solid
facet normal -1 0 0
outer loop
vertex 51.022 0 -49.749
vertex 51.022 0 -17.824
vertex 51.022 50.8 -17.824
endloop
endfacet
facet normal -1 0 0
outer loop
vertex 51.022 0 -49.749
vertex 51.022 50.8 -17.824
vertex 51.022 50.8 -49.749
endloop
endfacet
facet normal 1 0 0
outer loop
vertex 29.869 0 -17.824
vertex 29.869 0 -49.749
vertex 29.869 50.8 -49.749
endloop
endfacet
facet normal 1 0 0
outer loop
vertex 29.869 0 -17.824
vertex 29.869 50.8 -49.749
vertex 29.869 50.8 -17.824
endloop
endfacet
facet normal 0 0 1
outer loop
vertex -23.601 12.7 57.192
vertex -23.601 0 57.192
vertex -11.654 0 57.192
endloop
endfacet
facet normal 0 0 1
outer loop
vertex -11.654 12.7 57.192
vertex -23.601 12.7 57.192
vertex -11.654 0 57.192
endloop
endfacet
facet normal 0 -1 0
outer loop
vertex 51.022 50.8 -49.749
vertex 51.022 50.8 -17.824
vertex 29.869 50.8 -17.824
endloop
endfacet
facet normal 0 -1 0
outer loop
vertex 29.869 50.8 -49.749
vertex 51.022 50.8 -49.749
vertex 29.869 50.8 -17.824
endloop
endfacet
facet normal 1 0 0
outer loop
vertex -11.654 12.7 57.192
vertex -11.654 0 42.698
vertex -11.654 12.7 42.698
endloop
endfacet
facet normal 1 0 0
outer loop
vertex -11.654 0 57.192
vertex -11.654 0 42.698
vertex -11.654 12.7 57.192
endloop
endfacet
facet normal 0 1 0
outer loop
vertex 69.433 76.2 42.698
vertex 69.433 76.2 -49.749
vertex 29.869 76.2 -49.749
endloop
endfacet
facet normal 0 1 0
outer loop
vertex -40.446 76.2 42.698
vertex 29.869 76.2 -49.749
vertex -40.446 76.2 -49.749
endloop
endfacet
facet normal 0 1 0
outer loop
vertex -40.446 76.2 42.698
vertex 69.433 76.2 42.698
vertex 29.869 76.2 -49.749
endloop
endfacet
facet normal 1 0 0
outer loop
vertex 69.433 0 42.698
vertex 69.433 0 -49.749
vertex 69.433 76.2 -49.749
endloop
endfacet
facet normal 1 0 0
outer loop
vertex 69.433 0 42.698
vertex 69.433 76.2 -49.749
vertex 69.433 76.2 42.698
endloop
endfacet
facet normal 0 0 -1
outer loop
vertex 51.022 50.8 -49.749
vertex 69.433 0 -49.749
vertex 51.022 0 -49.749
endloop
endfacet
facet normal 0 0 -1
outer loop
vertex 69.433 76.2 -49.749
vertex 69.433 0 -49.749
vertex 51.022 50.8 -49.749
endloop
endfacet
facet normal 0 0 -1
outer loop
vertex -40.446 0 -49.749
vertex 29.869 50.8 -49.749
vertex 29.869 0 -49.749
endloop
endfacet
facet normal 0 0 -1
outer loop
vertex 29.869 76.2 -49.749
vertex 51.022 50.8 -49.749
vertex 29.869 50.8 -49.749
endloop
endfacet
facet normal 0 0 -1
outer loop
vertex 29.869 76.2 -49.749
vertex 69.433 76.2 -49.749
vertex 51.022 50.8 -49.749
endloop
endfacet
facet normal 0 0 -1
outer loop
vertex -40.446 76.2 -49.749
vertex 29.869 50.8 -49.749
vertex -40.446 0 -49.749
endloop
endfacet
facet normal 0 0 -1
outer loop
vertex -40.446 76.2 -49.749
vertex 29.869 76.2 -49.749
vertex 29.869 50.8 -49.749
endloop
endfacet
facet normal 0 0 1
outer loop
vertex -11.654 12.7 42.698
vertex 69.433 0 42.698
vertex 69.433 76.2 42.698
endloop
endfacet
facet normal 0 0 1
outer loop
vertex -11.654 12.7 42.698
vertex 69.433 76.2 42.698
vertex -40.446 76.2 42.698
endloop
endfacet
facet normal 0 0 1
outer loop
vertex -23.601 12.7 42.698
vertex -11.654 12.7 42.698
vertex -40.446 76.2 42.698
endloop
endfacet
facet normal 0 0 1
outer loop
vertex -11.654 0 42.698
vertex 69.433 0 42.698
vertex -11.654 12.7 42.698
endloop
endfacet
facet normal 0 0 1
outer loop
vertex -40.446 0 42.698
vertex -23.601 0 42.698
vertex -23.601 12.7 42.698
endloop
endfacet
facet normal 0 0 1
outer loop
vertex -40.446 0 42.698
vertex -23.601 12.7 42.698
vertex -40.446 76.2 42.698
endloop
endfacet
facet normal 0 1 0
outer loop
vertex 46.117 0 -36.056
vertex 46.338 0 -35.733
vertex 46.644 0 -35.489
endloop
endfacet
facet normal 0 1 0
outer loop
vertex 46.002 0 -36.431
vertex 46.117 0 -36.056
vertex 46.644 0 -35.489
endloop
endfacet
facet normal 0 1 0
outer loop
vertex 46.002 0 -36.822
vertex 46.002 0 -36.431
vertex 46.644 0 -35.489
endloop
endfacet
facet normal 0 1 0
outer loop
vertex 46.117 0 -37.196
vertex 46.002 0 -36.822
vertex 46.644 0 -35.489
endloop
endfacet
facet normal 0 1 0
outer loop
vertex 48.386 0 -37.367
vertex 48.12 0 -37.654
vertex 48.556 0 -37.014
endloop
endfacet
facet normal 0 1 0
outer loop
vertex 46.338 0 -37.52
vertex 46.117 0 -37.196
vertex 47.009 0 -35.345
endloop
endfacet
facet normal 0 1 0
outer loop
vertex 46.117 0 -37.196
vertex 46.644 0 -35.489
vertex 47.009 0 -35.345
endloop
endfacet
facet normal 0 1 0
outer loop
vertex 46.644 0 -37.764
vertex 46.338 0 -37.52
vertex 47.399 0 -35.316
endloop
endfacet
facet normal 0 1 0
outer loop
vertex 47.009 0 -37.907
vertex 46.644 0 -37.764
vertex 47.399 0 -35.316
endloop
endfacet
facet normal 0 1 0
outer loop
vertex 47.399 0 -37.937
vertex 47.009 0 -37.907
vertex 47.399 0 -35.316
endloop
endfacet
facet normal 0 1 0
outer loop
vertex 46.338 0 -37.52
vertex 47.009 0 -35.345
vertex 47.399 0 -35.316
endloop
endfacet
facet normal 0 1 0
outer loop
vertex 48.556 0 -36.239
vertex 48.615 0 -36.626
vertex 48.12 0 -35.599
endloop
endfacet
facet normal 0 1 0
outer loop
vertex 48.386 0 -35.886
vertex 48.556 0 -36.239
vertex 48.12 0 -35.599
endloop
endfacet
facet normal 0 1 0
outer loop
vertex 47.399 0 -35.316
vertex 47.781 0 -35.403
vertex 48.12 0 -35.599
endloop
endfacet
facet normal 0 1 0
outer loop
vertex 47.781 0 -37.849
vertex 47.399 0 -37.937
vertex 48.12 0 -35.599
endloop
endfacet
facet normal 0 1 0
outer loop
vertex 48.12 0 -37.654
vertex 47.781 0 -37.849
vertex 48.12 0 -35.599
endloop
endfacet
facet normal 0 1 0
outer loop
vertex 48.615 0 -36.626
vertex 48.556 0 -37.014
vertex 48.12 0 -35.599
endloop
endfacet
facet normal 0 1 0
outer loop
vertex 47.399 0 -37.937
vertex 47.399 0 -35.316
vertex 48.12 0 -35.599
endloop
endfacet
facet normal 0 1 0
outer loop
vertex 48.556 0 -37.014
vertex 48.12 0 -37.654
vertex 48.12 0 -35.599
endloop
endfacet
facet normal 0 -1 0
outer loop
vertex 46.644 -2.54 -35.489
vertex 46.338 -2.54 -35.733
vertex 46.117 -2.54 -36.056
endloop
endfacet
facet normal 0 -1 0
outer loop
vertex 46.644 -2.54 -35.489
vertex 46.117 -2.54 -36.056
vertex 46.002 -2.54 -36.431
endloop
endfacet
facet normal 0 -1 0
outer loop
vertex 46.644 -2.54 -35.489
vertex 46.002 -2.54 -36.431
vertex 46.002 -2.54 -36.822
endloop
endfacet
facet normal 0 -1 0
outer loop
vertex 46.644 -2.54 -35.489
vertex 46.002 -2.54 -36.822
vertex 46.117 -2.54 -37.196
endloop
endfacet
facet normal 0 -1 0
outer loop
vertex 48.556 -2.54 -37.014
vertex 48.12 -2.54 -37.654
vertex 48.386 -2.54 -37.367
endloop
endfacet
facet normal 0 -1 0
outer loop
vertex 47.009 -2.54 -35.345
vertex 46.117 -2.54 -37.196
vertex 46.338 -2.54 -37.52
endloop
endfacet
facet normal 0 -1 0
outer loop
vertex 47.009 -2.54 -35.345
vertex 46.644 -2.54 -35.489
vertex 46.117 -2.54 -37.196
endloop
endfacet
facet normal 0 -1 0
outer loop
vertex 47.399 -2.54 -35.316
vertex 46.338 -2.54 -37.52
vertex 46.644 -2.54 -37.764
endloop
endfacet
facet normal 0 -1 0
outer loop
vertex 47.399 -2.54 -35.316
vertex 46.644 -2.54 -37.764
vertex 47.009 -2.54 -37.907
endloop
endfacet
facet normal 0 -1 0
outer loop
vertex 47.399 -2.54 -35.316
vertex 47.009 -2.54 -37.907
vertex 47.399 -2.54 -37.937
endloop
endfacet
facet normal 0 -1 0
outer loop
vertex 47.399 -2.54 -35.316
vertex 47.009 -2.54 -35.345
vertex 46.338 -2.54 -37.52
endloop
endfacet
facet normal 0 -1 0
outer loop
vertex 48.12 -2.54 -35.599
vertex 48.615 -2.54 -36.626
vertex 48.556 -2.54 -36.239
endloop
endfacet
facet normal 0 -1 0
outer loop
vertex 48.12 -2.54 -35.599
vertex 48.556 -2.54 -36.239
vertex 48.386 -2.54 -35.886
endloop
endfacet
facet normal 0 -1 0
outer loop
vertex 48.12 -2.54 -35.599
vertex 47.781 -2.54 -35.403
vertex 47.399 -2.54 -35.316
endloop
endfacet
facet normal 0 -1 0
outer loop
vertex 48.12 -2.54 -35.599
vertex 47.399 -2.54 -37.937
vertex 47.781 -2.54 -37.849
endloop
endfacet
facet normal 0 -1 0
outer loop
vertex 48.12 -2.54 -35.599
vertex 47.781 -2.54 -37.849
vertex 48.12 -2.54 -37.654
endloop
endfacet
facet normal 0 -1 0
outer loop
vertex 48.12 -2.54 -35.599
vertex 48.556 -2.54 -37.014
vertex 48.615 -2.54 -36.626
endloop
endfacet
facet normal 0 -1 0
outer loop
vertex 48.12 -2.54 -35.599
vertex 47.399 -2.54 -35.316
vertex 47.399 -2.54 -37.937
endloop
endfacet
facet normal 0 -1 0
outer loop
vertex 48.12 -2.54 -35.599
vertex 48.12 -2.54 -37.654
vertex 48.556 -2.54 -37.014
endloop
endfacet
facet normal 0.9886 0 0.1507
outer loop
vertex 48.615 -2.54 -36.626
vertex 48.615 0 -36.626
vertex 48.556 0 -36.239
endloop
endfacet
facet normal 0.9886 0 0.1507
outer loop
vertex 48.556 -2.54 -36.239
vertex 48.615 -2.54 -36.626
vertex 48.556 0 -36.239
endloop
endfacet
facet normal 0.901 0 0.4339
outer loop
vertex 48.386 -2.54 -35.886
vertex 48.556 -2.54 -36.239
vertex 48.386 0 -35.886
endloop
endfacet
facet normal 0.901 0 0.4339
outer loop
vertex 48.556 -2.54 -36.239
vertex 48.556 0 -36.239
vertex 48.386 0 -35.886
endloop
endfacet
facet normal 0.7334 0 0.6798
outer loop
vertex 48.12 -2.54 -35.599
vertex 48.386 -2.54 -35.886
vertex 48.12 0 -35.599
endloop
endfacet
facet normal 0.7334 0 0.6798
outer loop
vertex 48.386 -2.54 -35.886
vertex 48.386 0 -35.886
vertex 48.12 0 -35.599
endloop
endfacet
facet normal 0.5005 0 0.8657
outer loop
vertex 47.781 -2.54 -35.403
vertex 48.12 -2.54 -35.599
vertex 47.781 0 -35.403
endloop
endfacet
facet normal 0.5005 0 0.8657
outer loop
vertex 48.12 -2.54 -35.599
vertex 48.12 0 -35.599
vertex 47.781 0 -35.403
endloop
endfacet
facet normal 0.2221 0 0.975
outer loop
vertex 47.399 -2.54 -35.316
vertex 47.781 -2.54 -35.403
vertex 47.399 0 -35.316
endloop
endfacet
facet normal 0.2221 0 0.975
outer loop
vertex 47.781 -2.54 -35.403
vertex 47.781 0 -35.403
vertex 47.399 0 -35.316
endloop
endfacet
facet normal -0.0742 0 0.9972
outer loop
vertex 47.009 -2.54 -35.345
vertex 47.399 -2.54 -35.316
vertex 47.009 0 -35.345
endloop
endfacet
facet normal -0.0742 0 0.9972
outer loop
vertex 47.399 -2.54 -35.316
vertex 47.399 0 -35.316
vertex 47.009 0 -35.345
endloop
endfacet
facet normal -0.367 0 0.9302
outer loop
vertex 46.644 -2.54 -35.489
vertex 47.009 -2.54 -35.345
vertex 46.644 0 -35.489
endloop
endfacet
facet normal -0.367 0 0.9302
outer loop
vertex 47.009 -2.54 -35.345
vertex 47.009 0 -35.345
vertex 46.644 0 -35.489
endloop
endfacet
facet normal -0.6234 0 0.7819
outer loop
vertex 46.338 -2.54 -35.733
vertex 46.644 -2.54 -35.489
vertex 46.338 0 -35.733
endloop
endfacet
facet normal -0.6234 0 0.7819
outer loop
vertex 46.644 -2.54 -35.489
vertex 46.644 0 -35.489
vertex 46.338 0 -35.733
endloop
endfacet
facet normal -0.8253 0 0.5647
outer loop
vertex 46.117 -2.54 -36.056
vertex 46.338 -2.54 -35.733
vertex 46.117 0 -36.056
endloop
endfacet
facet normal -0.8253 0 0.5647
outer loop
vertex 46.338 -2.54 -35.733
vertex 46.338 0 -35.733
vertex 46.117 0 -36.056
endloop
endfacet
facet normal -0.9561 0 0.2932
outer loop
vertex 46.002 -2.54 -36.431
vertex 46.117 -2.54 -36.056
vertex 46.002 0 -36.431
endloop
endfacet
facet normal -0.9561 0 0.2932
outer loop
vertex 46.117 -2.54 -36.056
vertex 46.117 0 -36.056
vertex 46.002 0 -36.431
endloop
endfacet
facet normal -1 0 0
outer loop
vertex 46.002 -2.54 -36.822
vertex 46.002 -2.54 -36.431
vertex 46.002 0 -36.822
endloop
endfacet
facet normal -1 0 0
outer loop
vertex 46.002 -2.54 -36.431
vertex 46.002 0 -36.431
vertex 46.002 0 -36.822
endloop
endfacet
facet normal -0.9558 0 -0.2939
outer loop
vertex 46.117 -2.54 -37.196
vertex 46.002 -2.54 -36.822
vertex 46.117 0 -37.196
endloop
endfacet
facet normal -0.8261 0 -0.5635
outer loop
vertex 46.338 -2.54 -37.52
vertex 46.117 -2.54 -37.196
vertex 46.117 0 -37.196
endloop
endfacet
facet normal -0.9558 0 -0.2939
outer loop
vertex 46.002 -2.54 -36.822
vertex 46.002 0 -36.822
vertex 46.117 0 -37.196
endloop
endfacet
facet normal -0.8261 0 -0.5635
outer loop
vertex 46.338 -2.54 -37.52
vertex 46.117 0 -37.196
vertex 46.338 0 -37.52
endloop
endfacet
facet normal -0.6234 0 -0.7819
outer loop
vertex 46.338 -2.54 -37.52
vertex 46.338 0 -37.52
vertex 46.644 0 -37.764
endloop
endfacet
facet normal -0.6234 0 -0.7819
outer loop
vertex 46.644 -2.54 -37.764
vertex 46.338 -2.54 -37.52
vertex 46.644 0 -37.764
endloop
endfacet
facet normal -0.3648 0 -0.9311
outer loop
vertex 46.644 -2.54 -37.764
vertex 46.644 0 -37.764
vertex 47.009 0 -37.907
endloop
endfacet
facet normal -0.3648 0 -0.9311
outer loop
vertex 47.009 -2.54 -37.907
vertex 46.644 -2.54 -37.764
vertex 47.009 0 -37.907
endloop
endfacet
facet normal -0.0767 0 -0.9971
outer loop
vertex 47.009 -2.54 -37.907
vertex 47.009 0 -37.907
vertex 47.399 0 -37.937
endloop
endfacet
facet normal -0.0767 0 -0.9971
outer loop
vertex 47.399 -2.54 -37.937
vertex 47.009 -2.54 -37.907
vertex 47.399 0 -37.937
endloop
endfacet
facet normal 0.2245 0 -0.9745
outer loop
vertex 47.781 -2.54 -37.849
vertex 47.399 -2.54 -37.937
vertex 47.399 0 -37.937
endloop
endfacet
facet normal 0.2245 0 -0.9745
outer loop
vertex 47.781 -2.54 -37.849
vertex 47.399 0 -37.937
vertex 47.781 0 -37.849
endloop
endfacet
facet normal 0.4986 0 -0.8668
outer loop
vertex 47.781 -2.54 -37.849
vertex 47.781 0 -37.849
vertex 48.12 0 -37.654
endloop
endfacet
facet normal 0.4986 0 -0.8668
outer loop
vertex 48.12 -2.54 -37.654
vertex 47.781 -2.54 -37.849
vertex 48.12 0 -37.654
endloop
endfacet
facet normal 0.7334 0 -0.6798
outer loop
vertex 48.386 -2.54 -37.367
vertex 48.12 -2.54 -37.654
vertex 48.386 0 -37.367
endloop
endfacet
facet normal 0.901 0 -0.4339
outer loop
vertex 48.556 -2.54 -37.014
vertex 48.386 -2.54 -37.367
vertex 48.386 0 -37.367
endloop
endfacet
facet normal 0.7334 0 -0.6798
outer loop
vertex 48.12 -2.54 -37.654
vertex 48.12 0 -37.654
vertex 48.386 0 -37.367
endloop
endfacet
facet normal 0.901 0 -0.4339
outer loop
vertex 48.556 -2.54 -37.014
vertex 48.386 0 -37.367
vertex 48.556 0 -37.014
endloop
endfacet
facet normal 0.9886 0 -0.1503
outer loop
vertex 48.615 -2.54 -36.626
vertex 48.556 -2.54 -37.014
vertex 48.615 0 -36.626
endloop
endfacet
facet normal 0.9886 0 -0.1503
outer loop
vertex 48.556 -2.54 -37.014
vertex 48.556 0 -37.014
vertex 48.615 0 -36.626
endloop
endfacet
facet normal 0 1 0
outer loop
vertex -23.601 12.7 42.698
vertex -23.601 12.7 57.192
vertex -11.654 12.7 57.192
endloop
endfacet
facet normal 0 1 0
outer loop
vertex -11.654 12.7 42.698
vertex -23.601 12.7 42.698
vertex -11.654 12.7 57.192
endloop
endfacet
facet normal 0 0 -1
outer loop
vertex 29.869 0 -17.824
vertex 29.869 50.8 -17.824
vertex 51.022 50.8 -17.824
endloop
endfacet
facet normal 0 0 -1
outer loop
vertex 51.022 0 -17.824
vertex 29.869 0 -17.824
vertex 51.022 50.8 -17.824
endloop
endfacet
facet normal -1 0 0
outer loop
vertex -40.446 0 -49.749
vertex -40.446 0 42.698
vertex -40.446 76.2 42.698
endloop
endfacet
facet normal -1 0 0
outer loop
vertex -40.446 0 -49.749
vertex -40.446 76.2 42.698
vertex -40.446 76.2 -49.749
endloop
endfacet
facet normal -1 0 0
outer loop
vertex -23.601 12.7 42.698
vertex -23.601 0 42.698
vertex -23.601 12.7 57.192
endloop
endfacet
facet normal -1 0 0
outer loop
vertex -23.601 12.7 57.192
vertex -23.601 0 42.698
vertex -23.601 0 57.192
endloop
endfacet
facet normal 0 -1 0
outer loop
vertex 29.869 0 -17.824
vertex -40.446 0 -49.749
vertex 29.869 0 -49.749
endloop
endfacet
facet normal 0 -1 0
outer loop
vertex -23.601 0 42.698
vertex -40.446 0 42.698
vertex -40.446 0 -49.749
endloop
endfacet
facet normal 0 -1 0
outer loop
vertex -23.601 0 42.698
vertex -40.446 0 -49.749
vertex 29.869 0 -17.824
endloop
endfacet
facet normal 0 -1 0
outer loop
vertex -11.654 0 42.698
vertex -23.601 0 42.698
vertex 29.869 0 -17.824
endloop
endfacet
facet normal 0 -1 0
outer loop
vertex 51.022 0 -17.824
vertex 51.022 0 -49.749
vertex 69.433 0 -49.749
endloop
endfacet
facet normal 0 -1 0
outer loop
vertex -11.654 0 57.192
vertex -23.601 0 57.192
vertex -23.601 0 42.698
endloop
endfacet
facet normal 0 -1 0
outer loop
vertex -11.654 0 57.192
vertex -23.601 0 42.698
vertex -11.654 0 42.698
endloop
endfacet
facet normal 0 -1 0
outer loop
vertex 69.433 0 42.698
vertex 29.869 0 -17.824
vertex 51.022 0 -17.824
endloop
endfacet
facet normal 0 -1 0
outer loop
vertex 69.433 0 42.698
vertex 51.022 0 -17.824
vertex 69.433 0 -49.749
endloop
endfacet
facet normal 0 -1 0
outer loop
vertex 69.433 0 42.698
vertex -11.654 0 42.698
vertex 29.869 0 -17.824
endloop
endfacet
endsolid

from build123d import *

# Parameters (mm, degrees)
F1_DEPTH = 76.2
F0_W     = 11.9476383552
F0_H     = 14.4938491285
F2_DEPTH = 12.7
F3_R     = 1.3138879376
F4_DEPTH = 2.54
F5_W     = 21.1531911045
F5_H     = 31.9256559014
F6_DEPTH = 25.4


with BuildPart() as f1:
    # F0 (on Front) → F1 (new body)
    with BuildSketch(Plane.XZ):
        Polygon((-40.4456928372, 42.6981188357), (-40.4456928372, -49.7491806746), (29.8690963537, -49.7491806746), (29.8690963537, -17.8235247731), (51.0222874582, -17.8235247731), (51.0222874582, -49.7491806746), (69.4333985448, -49.7491806746), (69.4333985448, 42.6981188357), (-11.6538433358, 42.6981188357), (-23.601481691, 42.6981188357), align=None)
    extrude(amount=-F1_DEPTH)

    # F0 (on Front) → F2 (join)
    with BuildSketch(Plane.XZ):
        with Locations((-17.6276625134, 49.9450433999)):
            Rectangle(F0_W, F0_H)
    extrude(amount=-F2_DEPTH)

    # F5 (on face) → F6 (join)
    with BuildSketch(Plane(origin=(0, 76.2, 0), x_dir=(-1, 0, 0), z_dir=(0, 1, 0))):
        with Locations((-40.4456919059, -33.7863527238)):
            Rectangle(F5_W, F5_H)
    extrude(amount=-F6_DEPTH)


with BuildPart() as f4:
    # F3 (on face) → F4 (new body)
    with BuildSketch(Plane.XZ):
        with Locations((47.3008938134, -36.6263650358)):
            Circle(F3_R)
    extrude(amount=F4_DEPTH)


solid = Compound([f1.part, f4.part])
